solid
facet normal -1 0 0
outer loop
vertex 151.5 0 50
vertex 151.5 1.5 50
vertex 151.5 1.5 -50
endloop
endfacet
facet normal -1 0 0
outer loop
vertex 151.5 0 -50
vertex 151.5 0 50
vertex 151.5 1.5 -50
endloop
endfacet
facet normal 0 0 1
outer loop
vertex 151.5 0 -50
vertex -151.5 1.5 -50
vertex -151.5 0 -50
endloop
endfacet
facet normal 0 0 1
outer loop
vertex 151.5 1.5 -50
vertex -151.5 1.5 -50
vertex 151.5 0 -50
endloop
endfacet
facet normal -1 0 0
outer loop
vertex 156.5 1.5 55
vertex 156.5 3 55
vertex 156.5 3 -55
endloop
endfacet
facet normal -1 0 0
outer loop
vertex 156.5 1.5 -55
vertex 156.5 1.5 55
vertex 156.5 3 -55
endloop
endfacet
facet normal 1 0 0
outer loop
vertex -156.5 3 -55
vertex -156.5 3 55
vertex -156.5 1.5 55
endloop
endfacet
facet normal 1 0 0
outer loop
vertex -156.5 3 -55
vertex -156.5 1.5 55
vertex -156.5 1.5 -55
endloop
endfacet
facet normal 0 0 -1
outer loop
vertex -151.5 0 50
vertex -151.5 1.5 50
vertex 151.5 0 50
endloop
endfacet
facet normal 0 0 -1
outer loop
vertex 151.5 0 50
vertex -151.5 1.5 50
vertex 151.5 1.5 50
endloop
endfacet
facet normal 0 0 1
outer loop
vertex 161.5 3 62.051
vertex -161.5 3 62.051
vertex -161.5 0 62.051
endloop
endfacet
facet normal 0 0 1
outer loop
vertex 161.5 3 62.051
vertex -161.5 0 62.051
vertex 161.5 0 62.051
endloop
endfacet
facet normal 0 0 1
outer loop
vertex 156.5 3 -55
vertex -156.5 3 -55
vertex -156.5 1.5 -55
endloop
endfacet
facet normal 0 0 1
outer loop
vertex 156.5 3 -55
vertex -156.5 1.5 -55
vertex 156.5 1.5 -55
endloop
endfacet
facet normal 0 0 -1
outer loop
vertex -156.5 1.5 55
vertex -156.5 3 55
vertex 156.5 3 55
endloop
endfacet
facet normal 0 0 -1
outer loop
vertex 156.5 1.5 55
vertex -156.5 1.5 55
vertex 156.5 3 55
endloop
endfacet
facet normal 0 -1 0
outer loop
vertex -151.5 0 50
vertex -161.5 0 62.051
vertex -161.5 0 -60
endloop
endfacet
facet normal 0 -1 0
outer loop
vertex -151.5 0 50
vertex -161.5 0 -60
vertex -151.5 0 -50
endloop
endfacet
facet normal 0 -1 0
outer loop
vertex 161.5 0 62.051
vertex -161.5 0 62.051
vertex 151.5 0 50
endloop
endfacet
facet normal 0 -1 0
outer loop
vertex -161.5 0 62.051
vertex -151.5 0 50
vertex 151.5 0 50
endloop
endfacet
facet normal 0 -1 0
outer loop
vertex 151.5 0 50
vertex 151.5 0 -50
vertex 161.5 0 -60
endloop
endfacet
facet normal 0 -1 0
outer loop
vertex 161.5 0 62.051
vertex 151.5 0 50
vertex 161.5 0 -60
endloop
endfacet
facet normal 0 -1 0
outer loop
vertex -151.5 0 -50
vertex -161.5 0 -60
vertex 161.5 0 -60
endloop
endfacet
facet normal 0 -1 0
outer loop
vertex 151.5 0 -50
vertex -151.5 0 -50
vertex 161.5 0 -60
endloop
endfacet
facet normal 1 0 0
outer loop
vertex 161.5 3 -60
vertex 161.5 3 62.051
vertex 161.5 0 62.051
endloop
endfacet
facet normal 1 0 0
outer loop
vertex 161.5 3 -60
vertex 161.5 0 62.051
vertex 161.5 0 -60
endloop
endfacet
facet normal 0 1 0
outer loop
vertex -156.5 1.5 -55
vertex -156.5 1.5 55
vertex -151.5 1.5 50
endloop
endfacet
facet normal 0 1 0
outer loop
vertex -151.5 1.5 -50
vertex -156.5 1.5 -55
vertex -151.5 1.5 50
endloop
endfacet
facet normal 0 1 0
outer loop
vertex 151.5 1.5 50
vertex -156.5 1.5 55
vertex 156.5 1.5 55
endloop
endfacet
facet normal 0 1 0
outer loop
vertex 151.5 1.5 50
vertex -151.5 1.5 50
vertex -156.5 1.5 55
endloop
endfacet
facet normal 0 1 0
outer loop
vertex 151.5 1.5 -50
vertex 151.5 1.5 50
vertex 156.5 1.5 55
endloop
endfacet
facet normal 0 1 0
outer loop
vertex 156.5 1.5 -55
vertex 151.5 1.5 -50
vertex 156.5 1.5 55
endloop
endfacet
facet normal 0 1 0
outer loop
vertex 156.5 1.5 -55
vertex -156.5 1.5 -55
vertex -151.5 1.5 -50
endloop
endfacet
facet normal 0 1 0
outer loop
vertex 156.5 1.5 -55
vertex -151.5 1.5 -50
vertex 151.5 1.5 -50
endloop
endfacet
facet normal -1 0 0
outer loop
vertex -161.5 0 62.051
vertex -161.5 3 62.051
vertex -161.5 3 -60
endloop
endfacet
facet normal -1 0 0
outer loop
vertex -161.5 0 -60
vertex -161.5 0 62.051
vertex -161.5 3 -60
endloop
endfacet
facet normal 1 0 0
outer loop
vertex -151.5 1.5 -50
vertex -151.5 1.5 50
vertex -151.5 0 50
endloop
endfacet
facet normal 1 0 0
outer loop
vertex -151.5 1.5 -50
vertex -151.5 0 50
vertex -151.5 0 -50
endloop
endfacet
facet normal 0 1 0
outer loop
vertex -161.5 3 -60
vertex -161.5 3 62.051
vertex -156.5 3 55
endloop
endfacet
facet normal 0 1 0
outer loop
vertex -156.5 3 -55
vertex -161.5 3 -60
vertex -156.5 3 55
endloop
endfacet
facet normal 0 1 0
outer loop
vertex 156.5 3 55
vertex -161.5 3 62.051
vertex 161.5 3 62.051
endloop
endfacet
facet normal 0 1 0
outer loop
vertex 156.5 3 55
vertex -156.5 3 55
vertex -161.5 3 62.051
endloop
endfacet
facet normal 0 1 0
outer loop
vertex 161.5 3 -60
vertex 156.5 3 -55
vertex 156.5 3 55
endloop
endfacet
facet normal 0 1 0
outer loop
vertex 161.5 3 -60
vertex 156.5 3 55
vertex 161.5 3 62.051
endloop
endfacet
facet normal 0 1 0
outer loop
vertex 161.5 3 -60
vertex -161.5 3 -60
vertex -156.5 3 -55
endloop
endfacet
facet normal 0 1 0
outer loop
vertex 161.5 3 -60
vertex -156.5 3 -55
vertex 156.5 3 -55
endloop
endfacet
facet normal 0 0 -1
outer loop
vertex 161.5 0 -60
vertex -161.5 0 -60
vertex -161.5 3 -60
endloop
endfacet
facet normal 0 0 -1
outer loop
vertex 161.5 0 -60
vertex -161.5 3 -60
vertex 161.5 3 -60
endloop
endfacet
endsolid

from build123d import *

# Parameters (mm, degrees)
SKETCH1_W               = 323
SKETCH1_H               = 120
BOSS_EXTRUDE1_DEPTH     = 3
SKETCH2_W               = 313
SKETCH2_H               = 110
SKETCH2_W_2             = 303
SKETCH2_H_2             = 100
CUT_EXTRUDE2_DEPTH      = 1.5
SKETCH2_4_W             = 303
SKETCH2_4_H             = 100
CUT_EXTRUDE3_DEPTH      = 1
CUT_EXTRUDE3_DEPTH_BACK = 4
SKETCH3_W               = 323
SKETCH3_H               = 2.051483501
BOSS_EXTRUDE2_DEPTH     = 3


with BuildPart() as part:
    # Sketch1 → Boss-Extrude1 (new body)
    with BuildSketch(Plane(origin=(0, 0, 0), x_dir=(1, 0, 0), z_dir=(0, 1, 0))):
        Rectangle(SKETCH1_W, SKETCH1_H)
    extrude(amount=BOSS_EXTRUDE1_DEPTH)

    # Sketch2 → Cut-Extrude2 (cut)
    with BuildSketch(Plane(origin=(0, 3, 0), x_dir=(1, 0, 0), z_dir=(0, 1, 0))):
        Rectangle(SKETCH2_W, SKETCH2_H)
        Rectangle(SKETCH2_W_2, SKETCH2_H_2, mode=Mode.SUBTRACT)
    extrude(amount=-CUT_EXTRUDE2_DEPTH, mode=Mode.SUBTRACT)

    # Sketch2_4 → Cut-Extrude3 (cut, two sides)
    with BuildSketch(Plane(origin=(0, 3, 0), x_dir=(1, 0, 0), z_dir=(0, 1, 0))) as cut_extrude3_sk:
        Rectangle(SKETCH2_4_W, SKETCH2_4_H)
    extrude(amount=CUT_EXTRUDE3_DEPTH, mode=Mode.SUBTRACT)
    extrude(cut_extrude3_sk.sketch, amount=-CUT_EXTRUDE3_DEPTH_BACK, mode=Mode.SUBTRACT)

    # Sketch3 → Boss-Extrude2 (add)
    with BuildSketch(Plane(origin=(0, 3, 0), x_dir=(1, 0, 0), z_dir=(0, 1, 0))):
        with Locations((0, -61.025741751)):
            Rectangle(SKETCH3_W, SKETCH3_H)
    extrude(amount=-BOSS_EXTRUDE2_DEPTH)


solid = part.part
